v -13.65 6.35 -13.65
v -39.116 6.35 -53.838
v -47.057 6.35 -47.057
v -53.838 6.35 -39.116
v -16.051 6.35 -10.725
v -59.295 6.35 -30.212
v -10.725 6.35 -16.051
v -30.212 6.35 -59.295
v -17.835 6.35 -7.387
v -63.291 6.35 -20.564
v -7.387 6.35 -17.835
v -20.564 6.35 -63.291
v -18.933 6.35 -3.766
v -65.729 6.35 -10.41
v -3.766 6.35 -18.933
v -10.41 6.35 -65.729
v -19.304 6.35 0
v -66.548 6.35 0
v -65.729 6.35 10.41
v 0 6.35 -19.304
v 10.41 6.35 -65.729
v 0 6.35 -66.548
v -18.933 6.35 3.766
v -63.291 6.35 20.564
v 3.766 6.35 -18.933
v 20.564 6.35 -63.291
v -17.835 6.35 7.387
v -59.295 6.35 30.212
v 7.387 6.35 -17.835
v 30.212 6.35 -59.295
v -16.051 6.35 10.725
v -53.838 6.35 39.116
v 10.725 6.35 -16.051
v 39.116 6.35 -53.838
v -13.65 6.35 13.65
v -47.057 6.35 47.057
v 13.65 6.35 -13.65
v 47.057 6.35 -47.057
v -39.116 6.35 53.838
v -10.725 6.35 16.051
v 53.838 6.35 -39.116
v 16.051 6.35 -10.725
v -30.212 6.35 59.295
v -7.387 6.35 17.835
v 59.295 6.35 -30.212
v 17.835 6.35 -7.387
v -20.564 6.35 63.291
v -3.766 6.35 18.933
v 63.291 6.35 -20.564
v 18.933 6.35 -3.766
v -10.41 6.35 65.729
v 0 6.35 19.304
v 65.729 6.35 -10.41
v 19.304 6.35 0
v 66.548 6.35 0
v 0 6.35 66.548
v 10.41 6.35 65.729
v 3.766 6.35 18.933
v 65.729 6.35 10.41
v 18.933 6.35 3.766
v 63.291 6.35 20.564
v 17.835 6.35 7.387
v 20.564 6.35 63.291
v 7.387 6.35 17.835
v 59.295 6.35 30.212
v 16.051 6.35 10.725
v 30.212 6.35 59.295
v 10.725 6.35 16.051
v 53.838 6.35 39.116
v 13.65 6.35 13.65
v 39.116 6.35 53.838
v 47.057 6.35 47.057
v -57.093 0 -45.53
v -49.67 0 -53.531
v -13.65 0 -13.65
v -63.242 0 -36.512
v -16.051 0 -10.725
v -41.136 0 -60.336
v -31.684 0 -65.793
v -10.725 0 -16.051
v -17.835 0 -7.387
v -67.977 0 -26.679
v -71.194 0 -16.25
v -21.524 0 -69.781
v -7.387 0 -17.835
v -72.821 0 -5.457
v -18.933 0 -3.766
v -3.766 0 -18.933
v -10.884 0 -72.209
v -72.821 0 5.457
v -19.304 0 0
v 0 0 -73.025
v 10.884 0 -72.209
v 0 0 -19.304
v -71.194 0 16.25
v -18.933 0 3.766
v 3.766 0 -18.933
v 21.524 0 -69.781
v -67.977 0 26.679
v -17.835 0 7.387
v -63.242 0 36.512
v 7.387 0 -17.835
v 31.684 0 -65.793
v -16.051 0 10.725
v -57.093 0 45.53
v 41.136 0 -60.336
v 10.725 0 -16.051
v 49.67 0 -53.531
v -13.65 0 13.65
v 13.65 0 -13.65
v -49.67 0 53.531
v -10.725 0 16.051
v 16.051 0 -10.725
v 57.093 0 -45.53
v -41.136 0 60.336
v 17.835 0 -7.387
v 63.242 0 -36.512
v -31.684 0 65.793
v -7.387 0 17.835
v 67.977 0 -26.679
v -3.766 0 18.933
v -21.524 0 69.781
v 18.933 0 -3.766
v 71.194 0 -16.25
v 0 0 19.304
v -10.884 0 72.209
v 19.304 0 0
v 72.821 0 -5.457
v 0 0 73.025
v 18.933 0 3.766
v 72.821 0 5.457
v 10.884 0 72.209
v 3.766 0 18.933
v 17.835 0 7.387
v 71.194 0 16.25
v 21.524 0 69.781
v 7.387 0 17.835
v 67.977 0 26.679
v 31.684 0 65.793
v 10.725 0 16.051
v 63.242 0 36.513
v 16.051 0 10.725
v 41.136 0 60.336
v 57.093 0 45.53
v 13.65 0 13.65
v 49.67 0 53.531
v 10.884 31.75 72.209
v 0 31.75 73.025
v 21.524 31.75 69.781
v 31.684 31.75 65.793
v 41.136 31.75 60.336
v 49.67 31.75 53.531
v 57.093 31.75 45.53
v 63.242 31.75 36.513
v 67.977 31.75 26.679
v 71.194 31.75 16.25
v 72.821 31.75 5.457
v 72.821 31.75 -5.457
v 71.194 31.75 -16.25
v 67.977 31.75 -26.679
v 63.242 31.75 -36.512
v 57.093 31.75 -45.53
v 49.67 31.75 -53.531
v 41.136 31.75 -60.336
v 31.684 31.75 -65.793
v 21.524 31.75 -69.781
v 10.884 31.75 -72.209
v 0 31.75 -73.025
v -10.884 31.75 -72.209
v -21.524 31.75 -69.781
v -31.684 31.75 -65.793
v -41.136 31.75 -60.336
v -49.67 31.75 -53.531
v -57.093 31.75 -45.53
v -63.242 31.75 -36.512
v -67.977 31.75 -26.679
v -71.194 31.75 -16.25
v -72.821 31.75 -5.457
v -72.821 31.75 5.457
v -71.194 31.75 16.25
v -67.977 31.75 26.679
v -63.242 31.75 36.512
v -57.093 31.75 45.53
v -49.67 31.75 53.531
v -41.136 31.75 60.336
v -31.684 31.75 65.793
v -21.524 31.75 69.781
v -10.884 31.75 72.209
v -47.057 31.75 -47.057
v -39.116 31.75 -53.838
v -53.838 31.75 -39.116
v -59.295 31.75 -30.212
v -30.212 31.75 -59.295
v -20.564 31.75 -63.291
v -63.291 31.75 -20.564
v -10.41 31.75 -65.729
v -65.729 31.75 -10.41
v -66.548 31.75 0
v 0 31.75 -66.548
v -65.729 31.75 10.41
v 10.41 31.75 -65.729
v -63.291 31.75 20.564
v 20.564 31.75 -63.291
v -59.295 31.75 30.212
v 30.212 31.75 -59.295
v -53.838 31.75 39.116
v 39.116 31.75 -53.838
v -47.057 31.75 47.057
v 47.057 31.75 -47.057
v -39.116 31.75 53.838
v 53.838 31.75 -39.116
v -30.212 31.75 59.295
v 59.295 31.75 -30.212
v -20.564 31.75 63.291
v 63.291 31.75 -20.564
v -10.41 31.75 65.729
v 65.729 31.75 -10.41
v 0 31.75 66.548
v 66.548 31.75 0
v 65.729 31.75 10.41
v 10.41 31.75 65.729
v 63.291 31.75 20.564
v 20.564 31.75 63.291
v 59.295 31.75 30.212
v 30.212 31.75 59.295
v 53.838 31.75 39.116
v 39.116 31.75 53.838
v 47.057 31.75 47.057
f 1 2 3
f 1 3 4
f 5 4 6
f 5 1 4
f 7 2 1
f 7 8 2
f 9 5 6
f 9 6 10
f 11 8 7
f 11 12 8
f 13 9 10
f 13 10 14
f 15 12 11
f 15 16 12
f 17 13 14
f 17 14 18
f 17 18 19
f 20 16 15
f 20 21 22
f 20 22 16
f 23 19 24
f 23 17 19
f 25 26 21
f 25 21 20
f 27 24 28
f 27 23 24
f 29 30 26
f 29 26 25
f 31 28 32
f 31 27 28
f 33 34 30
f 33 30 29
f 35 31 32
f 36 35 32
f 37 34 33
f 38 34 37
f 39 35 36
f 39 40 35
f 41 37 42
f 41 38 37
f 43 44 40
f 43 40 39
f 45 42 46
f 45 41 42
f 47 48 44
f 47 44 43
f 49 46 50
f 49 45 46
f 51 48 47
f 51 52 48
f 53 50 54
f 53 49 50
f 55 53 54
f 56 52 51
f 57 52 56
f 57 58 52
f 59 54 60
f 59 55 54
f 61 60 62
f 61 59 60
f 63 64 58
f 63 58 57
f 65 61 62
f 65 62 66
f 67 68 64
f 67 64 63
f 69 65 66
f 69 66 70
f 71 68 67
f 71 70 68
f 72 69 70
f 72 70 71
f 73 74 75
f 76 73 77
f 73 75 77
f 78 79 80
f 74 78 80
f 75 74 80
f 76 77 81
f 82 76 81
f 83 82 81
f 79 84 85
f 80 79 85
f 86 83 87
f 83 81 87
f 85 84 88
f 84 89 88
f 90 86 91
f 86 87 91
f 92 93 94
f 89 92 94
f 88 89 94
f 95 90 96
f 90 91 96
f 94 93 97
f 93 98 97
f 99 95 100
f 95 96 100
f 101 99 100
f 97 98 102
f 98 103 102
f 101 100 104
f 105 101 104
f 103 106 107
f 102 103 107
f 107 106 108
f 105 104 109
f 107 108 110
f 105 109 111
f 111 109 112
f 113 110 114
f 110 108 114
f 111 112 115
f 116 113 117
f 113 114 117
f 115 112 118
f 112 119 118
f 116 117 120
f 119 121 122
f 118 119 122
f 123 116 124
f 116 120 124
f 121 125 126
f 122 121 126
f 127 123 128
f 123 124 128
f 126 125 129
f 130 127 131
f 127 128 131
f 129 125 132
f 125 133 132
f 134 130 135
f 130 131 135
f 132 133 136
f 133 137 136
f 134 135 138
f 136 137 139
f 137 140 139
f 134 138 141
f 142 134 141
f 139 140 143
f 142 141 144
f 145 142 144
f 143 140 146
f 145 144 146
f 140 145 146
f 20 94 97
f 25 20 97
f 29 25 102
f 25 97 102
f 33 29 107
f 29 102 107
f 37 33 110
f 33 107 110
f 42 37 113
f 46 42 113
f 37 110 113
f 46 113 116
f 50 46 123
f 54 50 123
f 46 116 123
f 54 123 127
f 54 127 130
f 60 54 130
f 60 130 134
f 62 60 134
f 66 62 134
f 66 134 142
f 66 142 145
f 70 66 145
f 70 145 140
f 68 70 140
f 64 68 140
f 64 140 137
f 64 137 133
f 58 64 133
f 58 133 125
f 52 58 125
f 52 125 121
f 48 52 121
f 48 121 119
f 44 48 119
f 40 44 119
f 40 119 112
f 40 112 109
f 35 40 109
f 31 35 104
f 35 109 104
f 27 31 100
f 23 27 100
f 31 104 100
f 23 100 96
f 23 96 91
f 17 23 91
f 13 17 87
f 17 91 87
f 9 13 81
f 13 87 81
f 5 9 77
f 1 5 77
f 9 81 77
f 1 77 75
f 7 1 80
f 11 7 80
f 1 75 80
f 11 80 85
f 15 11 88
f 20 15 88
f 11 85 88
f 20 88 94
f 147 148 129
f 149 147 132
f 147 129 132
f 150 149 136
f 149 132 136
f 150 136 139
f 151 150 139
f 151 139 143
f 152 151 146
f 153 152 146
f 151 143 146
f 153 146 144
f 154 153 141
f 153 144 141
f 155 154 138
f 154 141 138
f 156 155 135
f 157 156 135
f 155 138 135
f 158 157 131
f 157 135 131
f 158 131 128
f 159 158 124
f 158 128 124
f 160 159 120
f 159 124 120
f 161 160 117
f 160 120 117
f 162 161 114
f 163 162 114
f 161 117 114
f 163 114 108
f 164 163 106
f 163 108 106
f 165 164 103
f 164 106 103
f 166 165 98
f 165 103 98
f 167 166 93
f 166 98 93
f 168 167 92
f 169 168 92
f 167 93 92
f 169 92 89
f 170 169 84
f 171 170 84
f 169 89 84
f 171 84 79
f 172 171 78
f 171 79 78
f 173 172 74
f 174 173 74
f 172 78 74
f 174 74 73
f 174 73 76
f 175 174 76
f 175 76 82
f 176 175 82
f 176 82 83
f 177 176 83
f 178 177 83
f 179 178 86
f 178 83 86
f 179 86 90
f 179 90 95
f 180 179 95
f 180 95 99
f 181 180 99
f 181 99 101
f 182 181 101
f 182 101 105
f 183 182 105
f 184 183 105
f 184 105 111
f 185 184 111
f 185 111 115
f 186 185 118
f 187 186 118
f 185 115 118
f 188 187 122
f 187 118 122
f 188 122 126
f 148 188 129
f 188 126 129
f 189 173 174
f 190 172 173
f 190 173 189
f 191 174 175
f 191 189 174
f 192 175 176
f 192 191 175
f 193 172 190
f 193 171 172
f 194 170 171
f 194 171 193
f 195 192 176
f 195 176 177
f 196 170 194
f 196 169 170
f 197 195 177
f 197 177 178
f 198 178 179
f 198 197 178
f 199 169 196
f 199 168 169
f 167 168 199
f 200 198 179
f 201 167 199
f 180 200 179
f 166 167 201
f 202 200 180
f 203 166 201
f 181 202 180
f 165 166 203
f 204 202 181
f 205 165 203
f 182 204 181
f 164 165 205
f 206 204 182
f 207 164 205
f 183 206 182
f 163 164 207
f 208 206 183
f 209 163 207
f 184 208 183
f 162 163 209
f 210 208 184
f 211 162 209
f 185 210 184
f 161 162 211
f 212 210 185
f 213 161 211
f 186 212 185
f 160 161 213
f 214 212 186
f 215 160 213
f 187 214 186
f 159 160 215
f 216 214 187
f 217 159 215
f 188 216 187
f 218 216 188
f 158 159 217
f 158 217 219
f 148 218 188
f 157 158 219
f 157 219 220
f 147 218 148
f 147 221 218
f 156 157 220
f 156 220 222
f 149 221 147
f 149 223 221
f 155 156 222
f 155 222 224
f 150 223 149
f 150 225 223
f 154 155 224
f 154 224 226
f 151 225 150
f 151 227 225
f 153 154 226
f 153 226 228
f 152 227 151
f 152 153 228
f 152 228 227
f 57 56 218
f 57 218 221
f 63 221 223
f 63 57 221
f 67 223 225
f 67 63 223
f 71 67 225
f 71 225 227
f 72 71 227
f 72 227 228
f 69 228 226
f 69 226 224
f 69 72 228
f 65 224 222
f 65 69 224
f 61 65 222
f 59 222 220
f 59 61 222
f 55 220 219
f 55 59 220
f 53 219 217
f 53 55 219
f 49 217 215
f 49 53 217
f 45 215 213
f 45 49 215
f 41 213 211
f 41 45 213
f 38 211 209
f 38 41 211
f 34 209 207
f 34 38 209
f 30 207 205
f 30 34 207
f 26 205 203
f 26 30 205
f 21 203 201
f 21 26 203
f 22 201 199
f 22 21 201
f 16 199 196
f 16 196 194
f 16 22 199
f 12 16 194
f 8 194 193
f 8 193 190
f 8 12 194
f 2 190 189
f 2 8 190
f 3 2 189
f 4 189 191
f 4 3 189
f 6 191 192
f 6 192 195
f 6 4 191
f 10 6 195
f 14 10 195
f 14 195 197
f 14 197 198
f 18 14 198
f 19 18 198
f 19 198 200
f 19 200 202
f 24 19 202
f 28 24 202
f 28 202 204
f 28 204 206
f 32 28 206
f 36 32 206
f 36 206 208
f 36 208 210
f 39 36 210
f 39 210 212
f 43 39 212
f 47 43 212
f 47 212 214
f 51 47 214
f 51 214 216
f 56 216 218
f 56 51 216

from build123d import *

# Parameters (mm, degrees)
SKETCH1_R           = 73.025
BOSS_EXTRUDE1_DEPTH = 6.35
SKETCH2_R           = 73.025
SKETCH2_R_2         = 66.548
BOSS_EXTRUDE2_DEPTH = 25.4
CUT_EXTRUDE1_REACH  = 110.043
SKETCH3_R           = 19.304


with BuildPart() as part:
    # Sketch1 → Boss-Extrude1 (new body)
    with BuildSketch(Plane(origin=(0, 0, 0), x_dir=(1, 0, 0), z_dir=(0, 1, 0))):
        with Locations(Location((0, 0, 0), (0, 0, 270))):
            Circle(SKETCH1_R)
    extrude(amount=BOSS_EXTRUDE1_DEPTH)

    # Sketch2 → Boss-Extrude2 (add)
    with BuildSketch(Plane(origin=(0, 6.35, 0), x_dir=(1, 0, 0), z_dir=(0, 1, 0))):
        with Locations(Location((0, 0, 0), (0, 0, 270))):
            Circle(SKETCH2_R)
        with Locations(Location((0, 0, 0), (0, 0, 270))):
            Circle(SKETCH2_R_2, mode=Mode.SUBTRACT)
    extrude(amount=BOSS_EXTRUDE2_DEPTH)

    # Sketch3 → Cut-Extrude1 (cut, up to next)
    with BuildSketch(Plane.XZ, mode=Mode.PRIVATE) as cut_extrude1_sk1:
        with Locations(Location((0, 0, 0), (0, 0, 270))):
            Circle(SKETCH3_R)
    cut_extrude1_tool1 = extrude(cut_extrude1_sk1.sketch, amount=-CUT_EXTRUDE1_REACH, mode=Mode.PRIVATE) & part.part
    add(cut_extrude1_tool1.solids().sort_by_distance((0, 0, 0))[0], mode=Mode.SUBTRACT)


solid = part.part
